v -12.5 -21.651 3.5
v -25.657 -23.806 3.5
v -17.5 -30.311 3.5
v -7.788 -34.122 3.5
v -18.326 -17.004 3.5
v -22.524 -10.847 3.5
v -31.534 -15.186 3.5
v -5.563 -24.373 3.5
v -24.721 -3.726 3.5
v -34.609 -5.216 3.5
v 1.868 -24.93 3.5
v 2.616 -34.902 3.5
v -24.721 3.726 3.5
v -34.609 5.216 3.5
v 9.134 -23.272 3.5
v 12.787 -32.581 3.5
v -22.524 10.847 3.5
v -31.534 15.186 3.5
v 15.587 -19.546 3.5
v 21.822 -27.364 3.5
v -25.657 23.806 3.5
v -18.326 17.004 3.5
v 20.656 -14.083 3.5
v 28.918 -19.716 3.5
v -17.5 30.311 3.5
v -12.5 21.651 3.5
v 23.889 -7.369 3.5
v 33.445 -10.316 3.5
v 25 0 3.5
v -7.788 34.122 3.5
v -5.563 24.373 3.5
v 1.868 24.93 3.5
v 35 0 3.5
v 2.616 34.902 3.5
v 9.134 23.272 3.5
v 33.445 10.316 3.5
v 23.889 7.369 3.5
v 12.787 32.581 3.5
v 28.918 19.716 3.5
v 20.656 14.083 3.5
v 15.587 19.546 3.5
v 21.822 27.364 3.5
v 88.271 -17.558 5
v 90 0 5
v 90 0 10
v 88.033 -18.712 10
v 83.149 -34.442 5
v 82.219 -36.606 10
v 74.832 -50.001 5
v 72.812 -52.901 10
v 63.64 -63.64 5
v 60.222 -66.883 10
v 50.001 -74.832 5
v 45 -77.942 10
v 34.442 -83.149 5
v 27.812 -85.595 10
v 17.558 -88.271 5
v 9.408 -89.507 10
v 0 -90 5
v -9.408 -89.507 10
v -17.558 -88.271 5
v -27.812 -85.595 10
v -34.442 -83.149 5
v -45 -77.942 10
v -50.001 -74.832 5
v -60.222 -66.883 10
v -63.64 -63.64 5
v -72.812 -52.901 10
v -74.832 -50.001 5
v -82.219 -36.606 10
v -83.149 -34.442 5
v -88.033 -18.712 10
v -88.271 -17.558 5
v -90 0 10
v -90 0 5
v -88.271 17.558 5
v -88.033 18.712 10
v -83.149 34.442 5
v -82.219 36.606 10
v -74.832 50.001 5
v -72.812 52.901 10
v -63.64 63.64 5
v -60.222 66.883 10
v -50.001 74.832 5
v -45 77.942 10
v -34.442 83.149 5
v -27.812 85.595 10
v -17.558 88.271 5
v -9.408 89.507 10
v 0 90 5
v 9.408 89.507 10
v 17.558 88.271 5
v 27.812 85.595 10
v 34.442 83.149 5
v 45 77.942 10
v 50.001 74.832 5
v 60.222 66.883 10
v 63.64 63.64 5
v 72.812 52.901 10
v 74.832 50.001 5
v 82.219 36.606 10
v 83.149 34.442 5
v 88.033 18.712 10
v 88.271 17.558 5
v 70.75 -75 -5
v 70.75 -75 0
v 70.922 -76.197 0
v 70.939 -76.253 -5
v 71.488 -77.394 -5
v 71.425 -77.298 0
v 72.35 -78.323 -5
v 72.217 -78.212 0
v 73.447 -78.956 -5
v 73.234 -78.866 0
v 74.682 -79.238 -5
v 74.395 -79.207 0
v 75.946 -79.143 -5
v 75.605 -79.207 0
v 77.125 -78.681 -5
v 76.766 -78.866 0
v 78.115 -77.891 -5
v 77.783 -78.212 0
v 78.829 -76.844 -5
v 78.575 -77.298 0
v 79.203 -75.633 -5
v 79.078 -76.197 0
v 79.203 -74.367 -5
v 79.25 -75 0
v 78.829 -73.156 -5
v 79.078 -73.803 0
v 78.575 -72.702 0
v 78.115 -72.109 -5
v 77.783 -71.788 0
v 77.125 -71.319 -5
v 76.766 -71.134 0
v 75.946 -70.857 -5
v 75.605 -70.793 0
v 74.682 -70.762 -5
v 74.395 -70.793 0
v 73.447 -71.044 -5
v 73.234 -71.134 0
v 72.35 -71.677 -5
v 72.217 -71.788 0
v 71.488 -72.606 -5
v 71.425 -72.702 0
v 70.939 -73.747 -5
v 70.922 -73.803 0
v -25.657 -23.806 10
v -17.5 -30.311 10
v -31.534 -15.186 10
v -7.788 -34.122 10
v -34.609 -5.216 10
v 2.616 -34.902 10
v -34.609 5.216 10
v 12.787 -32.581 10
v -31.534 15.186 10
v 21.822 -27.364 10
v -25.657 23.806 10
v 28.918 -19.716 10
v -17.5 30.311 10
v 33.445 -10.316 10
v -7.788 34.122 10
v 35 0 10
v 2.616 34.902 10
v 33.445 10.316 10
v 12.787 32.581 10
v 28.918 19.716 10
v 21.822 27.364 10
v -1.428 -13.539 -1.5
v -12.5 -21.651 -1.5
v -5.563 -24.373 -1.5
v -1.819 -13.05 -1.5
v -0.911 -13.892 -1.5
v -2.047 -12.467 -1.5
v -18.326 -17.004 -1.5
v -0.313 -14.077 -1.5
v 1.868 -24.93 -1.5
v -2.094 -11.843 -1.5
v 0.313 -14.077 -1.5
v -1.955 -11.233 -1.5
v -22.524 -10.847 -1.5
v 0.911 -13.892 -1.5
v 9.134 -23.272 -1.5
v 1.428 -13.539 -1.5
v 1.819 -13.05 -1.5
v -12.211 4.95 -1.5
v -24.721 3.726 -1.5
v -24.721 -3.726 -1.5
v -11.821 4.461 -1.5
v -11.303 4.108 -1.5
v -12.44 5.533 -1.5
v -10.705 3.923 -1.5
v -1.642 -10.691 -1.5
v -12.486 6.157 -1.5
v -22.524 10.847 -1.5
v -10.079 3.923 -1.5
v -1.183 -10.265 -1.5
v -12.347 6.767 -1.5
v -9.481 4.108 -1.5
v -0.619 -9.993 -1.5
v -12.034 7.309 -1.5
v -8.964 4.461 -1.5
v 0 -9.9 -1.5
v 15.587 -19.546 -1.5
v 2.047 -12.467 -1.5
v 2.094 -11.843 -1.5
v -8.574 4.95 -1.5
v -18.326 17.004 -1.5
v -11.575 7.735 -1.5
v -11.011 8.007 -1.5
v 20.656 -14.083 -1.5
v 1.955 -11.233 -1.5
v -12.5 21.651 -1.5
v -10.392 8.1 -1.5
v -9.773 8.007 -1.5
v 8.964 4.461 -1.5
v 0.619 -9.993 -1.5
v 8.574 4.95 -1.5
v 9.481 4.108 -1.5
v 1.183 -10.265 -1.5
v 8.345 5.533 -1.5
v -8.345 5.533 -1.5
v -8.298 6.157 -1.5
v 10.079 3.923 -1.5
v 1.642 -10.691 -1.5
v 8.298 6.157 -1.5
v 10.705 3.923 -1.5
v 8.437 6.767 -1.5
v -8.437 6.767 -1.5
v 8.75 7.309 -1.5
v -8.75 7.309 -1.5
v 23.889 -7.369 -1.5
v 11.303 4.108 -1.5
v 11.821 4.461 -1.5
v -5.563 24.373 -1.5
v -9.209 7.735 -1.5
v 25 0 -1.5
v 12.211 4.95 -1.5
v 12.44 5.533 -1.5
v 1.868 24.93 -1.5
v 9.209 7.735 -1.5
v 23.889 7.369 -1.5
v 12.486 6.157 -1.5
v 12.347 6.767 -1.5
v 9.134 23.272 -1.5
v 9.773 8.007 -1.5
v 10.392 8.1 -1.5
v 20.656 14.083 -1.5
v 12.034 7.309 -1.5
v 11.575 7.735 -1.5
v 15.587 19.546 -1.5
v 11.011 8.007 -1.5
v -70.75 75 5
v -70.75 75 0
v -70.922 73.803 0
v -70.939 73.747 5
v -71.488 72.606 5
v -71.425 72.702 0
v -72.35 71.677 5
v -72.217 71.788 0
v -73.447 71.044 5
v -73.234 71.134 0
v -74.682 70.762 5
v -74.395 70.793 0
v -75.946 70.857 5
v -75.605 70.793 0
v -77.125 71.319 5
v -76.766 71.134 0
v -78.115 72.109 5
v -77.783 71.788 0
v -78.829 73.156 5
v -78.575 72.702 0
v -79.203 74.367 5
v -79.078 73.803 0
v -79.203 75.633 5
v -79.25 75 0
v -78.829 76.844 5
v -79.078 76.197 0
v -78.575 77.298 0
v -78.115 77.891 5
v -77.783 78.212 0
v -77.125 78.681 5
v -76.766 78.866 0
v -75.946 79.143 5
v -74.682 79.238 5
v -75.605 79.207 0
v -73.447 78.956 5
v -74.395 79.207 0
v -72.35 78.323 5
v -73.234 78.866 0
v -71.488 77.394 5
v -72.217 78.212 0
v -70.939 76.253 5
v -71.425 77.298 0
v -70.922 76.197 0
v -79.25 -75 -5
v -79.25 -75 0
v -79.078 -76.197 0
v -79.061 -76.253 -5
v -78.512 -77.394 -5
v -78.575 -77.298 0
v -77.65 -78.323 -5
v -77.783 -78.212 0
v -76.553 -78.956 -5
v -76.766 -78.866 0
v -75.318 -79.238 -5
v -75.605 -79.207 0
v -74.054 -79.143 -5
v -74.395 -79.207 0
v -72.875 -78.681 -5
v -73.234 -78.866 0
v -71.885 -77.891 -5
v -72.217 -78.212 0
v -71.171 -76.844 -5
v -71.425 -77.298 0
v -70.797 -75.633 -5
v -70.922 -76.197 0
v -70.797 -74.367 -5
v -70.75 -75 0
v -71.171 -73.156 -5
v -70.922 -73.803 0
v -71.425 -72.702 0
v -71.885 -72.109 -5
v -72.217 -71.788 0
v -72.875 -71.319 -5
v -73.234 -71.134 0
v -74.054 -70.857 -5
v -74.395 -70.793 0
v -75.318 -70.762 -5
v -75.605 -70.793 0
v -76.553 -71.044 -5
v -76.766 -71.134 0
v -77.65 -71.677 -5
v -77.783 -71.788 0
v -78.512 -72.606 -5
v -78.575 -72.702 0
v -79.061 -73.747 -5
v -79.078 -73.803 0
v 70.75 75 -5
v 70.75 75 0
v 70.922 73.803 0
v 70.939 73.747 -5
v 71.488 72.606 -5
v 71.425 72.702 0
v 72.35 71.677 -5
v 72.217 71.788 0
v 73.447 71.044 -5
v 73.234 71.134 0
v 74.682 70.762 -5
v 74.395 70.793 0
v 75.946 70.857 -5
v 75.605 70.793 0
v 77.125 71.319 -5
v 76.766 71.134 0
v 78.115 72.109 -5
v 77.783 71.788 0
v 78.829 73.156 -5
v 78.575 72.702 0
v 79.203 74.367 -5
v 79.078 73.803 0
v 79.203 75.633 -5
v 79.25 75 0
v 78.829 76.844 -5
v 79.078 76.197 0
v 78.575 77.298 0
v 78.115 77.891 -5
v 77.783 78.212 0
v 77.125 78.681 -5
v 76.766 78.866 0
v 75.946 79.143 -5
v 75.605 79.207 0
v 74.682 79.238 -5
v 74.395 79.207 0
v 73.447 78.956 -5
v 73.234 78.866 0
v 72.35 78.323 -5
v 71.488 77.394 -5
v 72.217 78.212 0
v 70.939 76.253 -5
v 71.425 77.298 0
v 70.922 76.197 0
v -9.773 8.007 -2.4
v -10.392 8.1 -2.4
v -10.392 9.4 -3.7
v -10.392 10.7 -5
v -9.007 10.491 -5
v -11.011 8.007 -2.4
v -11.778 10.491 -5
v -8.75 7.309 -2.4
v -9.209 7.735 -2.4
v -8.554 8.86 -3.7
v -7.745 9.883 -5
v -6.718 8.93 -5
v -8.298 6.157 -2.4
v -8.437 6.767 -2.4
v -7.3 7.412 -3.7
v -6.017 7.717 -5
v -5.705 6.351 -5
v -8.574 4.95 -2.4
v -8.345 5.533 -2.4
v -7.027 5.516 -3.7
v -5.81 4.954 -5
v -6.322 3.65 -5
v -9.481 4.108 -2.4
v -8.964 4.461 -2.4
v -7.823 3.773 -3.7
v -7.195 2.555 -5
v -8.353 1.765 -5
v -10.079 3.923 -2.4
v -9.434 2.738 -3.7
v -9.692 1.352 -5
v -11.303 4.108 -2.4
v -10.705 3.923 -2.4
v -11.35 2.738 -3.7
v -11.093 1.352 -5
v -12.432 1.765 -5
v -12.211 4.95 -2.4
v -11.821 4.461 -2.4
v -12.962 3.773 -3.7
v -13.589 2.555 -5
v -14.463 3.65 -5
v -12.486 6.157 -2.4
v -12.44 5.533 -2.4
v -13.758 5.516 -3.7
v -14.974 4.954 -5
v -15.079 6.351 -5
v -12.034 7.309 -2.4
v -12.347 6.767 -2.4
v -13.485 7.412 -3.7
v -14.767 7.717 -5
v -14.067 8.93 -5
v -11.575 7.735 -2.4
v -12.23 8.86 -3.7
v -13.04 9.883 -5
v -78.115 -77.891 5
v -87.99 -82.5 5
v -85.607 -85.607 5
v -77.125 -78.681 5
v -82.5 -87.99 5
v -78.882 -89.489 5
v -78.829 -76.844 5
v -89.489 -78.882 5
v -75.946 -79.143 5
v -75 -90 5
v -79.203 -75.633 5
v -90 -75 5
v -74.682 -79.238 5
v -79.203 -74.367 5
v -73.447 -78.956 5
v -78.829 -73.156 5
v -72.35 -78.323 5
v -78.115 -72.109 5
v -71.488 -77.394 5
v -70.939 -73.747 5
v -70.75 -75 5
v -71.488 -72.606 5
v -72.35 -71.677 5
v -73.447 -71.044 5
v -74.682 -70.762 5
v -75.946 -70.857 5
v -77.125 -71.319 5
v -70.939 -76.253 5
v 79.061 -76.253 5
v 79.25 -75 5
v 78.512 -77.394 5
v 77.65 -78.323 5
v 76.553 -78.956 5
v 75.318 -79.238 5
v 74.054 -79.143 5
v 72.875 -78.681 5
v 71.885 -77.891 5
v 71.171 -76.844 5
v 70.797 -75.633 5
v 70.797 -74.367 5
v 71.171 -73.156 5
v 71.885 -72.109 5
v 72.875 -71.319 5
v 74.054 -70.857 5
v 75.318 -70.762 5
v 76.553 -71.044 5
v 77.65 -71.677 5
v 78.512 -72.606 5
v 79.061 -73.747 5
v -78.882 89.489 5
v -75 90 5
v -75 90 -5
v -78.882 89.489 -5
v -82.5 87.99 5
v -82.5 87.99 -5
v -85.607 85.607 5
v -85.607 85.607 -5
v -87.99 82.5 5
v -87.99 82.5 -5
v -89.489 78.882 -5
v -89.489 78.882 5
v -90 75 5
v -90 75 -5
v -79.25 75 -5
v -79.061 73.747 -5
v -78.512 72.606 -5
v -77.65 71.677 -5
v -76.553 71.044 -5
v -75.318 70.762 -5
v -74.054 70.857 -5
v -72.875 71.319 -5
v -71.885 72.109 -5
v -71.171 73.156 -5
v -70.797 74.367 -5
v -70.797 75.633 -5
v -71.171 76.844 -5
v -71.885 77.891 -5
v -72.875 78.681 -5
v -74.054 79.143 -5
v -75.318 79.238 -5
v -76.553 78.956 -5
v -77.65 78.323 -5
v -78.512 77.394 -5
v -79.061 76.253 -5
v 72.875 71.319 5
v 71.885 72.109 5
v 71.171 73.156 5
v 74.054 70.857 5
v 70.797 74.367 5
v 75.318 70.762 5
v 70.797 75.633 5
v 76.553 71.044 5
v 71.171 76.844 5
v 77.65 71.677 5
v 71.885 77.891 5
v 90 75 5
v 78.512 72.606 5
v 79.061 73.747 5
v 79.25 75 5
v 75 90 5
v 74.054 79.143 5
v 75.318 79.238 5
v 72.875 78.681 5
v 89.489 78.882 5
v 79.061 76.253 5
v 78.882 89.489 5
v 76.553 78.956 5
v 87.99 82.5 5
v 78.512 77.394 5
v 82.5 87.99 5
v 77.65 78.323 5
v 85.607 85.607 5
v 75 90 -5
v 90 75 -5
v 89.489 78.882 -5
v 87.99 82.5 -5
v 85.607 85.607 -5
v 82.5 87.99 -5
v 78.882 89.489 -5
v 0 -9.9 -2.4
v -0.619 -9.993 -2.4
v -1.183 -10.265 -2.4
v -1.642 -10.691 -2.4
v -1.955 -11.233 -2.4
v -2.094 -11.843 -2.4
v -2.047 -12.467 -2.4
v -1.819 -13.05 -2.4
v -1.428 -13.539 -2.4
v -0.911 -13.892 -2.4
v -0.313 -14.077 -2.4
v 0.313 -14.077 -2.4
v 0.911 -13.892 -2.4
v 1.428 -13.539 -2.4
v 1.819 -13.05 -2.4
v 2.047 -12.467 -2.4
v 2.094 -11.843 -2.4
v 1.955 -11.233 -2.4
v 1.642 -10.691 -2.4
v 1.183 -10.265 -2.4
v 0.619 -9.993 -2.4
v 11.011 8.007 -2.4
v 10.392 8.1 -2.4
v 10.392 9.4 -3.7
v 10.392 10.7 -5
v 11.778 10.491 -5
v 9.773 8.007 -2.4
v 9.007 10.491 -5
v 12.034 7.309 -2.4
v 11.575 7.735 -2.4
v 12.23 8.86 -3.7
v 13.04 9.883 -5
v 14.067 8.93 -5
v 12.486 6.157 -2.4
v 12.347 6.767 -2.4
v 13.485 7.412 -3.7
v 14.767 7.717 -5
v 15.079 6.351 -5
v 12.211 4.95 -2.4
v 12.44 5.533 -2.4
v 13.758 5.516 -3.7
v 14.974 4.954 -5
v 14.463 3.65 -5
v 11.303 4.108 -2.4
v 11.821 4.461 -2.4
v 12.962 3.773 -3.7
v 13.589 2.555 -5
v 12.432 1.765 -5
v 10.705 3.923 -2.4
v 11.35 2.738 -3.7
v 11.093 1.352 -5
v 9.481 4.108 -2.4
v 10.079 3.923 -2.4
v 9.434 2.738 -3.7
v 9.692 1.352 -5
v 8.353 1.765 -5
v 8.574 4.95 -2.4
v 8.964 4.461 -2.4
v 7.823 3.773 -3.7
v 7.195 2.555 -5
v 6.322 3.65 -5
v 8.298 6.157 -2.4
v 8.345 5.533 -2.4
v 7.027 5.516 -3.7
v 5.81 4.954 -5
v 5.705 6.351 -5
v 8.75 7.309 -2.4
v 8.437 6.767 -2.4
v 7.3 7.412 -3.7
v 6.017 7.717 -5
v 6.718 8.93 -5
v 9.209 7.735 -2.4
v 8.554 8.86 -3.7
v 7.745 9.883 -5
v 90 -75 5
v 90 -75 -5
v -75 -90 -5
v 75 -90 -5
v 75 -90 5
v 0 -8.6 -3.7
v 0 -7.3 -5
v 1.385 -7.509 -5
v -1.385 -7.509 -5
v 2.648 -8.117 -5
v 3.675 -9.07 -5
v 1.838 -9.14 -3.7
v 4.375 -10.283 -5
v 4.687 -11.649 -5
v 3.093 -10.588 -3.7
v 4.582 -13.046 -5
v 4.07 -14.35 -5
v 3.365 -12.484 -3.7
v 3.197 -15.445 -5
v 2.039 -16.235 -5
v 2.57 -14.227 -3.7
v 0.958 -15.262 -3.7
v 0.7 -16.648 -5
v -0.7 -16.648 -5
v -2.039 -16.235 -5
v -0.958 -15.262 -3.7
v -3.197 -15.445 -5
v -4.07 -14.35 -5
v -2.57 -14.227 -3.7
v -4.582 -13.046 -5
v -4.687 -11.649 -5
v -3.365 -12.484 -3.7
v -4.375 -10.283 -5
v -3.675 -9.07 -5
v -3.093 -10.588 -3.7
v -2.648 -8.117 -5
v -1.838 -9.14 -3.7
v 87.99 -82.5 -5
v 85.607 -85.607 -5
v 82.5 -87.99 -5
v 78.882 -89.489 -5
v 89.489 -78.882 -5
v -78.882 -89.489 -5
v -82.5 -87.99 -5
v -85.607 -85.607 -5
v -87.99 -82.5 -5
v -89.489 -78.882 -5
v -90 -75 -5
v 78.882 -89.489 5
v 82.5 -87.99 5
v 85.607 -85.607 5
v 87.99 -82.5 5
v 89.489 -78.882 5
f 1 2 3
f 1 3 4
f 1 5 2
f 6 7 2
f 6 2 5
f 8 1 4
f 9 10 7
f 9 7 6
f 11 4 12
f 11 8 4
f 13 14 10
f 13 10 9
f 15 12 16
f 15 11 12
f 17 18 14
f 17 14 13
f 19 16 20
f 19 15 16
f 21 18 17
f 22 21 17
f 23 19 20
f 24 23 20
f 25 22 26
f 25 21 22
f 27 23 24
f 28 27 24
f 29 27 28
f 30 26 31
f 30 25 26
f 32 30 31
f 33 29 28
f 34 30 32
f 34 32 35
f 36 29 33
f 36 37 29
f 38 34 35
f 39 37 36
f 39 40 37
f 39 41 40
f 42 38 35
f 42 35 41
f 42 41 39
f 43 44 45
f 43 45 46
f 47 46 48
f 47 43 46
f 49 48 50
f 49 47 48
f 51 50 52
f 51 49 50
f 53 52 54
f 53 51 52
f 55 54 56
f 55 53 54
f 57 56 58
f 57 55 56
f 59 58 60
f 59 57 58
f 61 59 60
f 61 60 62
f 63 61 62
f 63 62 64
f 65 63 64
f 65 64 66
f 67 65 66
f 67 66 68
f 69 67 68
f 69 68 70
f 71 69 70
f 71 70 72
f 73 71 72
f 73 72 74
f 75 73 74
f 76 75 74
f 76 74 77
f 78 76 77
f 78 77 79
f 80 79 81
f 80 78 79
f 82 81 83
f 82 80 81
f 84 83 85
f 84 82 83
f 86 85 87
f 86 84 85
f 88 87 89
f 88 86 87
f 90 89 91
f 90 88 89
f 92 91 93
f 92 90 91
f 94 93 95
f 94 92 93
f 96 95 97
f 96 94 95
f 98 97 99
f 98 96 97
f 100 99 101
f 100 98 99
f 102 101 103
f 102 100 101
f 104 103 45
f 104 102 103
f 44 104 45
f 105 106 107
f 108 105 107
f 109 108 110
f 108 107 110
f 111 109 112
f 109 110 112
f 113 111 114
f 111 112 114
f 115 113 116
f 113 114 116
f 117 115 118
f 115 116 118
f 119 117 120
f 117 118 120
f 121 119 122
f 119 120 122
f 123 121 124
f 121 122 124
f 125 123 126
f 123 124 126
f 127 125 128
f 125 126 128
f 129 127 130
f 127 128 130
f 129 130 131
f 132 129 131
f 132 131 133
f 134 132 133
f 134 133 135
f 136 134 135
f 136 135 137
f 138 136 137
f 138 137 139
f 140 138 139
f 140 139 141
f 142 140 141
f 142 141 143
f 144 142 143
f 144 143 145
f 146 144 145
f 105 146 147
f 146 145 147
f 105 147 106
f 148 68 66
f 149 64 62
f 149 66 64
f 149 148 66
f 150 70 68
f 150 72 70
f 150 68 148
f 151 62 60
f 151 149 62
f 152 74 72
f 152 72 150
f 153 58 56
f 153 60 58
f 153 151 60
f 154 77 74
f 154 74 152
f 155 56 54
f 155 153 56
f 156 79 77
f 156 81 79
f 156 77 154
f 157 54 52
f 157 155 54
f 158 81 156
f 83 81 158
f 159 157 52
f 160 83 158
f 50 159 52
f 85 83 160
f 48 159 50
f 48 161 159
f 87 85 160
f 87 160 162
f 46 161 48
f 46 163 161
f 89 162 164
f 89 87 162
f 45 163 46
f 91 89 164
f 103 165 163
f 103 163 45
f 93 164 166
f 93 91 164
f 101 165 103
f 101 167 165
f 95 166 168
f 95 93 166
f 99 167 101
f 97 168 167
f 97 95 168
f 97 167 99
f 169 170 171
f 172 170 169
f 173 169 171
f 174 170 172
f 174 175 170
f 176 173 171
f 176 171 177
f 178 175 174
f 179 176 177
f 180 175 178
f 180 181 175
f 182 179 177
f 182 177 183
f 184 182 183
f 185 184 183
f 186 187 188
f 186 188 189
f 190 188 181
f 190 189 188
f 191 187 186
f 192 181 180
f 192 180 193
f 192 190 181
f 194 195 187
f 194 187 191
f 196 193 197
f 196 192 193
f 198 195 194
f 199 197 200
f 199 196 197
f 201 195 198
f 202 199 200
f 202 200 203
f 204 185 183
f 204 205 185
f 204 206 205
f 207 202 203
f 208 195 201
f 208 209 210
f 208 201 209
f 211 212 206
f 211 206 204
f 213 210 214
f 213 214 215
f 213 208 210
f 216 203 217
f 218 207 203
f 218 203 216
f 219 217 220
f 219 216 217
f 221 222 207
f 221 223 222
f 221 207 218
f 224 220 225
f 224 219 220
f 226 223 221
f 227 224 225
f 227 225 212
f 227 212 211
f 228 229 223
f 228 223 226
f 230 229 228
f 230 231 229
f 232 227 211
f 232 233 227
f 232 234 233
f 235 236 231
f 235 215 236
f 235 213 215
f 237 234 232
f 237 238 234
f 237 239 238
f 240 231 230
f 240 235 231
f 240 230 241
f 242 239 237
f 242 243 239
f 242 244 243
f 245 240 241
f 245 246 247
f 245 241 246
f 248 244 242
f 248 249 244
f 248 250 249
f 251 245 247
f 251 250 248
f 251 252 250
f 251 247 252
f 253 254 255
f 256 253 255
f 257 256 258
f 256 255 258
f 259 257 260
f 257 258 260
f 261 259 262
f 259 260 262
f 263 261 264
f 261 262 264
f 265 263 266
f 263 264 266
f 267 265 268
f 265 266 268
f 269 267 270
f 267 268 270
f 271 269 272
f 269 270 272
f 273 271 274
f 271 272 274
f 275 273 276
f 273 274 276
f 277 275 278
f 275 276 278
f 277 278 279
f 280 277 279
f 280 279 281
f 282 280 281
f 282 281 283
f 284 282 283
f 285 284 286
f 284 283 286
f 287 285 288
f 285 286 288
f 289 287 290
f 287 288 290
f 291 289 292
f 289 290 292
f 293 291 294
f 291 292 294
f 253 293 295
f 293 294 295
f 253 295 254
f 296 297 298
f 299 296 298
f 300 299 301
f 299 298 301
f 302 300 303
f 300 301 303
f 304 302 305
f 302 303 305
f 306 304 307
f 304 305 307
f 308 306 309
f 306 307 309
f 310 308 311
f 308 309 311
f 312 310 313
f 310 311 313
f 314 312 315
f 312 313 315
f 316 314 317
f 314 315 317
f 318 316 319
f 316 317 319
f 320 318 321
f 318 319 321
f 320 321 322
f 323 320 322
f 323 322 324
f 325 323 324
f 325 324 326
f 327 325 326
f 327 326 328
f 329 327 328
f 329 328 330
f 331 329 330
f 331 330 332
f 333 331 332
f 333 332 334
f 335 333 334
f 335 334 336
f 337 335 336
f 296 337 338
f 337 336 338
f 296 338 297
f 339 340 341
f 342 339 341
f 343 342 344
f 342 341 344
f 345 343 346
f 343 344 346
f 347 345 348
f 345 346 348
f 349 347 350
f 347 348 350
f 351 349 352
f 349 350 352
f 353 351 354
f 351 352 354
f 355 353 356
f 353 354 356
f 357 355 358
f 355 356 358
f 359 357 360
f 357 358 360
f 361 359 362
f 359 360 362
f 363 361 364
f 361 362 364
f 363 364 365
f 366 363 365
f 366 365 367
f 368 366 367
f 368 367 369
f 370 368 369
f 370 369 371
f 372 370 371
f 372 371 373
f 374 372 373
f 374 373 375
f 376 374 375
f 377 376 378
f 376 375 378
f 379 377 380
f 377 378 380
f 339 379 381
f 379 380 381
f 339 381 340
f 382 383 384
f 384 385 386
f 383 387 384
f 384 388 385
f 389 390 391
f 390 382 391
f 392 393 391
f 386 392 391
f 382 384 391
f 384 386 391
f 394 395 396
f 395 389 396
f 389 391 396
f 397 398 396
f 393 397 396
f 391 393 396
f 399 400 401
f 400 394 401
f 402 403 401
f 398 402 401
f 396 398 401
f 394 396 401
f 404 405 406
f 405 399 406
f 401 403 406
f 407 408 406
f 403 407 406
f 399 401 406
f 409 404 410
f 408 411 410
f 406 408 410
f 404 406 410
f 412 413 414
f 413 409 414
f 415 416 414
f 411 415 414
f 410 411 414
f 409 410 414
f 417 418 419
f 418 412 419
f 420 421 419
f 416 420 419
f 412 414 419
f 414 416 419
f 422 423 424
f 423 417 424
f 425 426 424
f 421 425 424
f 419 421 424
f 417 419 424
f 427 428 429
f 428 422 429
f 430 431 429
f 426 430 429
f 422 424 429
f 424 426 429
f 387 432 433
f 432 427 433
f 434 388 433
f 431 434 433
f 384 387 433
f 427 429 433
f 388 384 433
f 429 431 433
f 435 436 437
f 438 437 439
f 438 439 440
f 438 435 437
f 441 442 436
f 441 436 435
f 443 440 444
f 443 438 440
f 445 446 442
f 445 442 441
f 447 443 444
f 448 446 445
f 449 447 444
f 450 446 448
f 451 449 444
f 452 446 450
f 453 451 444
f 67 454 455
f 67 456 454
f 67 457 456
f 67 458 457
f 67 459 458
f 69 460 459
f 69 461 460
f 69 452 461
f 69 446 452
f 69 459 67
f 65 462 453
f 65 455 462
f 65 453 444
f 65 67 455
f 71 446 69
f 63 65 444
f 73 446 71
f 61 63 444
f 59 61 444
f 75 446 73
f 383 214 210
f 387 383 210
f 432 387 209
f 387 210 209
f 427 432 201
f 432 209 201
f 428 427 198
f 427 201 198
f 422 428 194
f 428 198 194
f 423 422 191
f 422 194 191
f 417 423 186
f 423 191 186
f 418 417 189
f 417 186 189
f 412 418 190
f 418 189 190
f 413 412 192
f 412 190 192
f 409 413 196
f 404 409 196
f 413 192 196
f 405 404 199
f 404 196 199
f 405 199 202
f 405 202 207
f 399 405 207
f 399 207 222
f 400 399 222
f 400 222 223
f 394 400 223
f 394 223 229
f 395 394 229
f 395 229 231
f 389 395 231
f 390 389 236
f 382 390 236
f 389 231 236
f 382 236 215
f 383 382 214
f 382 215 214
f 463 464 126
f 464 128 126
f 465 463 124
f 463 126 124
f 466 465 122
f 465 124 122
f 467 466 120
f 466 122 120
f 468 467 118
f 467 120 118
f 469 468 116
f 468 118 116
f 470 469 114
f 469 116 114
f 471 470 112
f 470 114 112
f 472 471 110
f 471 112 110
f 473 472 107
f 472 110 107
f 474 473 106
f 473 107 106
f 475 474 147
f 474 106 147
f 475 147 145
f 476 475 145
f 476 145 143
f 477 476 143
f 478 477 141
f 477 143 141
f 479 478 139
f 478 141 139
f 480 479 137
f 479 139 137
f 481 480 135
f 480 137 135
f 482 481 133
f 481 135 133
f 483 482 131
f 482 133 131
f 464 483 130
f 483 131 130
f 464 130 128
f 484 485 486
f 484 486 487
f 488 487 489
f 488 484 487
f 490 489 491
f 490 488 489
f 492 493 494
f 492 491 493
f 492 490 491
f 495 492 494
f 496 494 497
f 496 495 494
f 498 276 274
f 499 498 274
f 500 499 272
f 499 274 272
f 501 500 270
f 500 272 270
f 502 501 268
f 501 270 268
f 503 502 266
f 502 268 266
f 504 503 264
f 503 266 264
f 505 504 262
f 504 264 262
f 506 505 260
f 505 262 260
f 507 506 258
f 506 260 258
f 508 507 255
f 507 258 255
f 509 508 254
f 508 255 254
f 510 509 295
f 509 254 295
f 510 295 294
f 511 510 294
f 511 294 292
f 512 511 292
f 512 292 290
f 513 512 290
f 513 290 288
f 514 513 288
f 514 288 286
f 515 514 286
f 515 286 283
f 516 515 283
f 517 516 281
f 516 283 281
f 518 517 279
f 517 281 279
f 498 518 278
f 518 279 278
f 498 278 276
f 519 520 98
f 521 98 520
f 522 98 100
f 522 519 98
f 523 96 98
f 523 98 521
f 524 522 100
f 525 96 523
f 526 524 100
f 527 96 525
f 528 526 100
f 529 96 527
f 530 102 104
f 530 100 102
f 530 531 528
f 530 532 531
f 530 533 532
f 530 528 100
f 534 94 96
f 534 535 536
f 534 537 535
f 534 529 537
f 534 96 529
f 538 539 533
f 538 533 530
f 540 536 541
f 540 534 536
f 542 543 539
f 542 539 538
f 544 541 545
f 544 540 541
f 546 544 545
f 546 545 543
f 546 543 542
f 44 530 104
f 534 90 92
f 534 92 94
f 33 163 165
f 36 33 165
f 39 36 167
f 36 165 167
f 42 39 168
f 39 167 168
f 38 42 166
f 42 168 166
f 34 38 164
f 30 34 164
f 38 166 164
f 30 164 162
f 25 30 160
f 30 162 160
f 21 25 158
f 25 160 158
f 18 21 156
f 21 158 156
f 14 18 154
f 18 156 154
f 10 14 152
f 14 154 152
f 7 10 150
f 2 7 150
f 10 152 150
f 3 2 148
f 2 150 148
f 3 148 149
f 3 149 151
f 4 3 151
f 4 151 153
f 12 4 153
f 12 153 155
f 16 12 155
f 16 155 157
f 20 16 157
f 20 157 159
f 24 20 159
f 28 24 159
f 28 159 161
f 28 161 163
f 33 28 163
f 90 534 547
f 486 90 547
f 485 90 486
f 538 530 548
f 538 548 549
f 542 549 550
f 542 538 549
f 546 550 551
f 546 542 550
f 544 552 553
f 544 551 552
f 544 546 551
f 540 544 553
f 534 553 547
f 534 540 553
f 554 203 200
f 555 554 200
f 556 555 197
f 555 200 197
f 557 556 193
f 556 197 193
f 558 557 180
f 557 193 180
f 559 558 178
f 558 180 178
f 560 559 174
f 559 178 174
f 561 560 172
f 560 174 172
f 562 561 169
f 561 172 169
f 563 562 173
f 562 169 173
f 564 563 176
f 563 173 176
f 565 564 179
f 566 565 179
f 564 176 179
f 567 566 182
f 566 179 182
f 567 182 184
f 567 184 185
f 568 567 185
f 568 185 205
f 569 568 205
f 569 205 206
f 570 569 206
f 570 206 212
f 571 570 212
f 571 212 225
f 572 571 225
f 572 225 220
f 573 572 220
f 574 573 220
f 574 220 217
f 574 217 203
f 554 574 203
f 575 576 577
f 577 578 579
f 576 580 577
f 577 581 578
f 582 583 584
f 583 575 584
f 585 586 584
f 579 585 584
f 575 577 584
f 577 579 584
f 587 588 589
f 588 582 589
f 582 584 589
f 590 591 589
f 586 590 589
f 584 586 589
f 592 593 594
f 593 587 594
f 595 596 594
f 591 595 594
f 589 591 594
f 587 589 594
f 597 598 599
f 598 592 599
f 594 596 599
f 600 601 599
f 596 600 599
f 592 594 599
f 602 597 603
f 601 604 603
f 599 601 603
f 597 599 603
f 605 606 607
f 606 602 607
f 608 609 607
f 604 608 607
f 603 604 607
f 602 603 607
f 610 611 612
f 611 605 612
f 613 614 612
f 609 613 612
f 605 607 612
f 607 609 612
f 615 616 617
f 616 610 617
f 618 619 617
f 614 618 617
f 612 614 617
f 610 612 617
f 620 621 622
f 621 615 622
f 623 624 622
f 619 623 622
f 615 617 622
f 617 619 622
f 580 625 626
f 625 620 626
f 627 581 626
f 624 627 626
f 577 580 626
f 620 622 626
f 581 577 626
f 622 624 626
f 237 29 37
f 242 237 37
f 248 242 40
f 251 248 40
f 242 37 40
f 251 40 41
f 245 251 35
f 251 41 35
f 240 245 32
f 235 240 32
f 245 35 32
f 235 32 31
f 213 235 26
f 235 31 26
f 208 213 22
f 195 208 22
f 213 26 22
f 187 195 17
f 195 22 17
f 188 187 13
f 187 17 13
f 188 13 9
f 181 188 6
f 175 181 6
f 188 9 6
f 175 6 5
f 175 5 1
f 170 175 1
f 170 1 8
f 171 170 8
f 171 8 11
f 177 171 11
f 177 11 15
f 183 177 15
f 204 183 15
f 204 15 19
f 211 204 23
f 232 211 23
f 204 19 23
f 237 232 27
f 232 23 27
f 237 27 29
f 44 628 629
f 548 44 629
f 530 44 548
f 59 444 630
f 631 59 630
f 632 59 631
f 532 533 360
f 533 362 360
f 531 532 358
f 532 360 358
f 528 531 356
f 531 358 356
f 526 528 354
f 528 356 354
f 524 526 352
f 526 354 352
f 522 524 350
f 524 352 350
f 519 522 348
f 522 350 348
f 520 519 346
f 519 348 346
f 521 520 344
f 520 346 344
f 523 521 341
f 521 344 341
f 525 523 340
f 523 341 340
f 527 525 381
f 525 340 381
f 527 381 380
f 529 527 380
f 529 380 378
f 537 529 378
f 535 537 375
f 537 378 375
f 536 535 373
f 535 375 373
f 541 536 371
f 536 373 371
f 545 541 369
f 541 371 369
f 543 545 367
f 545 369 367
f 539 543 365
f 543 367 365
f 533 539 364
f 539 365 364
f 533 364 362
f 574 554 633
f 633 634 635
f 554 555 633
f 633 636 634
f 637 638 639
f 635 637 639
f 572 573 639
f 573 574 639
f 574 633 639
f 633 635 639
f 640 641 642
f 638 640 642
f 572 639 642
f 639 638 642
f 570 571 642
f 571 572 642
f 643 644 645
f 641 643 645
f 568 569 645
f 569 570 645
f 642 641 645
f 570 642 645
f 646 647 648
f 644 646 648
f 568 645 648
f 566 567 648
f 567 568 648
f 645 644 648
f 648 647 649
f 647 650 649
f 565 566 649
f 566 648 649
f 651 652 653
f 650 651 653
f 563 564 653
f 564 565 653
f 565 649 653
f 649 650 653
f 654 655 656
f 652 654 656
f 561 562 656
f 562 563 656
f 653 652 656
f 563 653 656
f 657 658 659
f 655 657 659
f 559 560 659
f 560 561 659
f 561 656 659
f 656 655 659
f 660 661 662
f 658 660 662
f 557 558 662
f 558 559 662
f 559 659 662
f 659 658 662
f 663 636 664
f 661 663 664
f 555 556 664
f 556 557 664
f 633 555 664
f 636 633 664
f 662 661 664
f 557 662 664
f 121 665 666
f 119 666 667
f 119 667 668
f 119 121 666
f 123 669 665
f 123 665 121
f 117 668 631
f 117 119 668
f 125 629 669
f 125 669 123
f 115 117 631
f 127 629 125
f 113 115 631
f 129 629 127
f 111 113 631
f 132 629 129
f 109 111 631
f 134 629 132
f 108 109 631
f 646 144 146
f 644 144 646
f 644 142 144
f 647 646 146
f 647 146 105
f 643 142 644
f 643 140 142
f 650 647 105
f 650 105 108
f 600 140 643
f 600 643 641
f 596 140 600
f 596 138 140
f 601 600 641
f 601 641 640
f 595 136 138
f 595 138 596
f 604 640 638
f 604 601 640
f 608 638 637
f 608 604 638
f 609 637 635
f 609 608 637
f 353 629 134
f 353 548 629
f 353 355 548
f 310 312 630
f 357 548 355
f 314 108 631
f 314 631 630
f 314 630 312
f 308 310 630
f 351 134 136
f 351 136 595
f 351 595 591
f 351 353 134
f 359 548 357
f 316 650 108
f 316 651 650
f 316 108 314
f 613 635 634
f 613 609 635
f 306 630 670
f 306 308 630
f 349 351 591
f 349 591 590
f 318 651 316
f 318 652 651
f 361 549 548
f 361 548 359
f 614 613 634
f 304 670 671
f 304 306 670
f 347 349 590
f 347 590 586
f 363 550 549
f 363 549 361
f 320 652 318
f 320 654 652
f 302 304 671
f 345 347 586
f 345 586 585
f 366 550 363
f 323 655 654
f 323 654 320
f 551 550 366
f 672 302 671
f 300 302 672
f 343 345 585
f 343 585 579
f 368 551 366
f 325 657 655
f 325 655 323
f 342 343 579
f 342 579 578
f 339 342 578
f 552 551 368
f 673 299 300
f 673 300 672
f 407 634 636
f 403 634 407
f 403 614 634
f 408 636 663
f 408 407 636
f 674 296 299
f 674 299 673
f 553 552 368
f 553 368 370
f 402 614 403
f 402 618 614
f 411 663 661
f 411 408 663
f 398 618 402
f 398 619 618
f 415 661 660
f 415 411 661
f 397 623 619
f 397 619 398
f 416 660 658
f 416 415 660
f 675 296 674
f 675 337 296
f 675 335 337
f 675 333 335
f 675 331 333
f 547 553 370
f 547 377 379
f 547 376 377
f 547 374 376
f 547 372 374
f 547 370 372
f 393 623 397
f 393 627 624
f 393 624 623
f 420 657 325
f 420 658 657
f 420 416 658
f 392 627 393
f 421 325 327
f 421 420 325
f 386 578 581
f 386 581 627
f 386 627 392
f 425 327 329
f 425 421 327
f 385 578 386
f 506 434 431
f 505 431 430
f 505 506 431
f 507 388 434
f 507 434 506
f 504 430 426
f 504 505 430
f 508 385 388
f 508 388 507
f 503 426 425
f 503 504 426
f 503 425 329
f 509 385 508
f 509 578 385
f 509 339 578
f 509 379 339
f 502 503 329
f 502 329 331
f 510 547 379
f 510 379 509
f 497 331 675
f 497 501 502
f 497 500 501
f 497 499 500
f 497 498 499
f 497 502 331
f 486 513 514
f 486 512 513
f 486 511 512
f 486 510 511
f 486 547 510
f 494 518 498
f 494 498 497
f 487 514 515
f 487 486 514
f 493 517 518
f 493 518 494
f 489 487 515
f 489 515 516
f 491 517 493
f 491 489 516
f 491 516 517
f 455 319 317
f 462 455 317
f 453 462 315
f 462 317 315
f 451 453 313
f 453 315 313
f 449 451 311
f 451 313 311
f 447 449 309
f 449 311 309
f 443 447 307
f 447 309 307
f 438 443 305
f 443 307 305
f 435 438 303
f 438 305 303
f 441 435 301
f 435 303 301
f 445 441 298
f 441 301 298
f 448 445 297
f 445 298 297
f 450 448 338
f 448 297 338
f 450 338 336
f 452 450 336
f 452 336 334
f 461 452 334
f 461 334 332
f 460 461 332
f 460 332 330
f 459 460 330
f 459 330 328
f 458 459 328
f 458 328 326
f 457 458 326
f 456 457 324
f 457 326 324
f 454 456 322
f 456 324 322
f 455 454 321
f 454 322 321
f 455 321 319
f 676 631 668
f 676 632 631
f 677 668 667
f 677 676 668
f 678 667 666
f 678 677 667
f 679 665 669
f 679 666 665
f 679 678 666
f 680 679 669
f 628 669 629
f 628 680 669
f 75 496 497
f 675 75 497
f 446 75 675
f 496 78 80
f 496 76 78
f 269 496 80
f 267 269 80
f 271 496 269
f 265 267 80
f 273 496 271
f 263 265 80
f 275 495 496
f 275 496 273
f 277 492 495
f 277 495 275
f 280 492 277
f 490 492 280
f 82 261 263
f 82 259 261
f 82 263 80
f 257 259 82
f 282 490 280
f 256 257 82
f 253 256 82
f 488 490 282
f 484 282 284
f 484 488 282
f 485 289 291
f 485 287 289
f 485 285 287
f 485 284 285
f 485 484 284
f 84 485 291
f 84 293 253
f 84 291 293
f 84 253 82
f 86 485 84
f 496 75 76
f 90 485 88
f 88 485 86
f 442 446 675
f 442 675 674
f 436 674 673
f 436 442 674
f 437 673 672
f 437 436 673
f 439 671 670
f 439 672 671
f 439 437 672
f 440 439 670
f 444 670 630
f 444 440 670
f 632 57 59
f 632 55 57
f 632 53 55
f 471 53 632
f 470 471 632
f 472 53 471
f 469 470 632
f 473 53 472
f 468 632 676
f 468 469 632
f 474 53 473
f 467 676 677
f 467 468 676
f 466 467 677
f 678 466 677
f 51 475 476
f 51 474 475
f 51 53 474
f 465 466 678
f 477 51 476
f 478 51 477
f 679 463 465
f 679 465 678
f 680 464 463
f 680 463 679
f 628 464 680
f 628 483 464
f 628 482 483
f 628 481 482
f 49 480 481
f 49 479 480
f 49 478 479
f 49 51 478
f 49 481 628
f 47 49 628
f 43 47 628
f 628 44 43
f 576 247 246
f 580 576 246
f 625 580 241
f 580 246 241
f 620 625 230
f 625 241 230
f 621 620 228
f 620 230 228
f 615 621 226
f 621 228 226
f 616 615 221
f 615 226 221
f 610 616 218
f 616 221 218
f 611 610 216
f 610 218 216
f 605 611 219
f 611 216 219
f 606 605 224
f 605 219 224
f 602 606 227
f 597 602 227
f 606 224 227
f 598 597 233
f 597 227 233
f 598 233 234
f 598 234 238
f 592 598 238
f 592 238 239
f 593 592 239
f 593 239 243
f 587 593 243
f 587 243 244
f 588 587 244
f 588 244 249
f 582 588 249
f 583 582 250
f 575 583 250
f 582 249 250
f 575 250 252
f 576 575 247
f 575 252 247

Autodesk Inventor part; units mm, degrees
ref_plane "YZ Plane" through (0, 0, 0) normal (1, 0, 0) x (0, 1, 0)
ref_plane "XZ Plane" through (0, 0, 0) normal (0, 1, 0) x (-1, 0, 0)
ref_plane "XY Plane" through (0, 0, 0) normal (0, 0, 1) x (1, 0, 0)
sketch "Sketch1" plane through (0, 0, 0) normal (0, 0, 1) x (1, 0, 0)
  circle A0 centre (0, 0) radius 90
  circle A1 centre (0, 0) radius 35
  line L0 (-75, 90) -> (75, 90)
  line L1 (90, 75) -> (90, -75)
  line L2 (75, -90) -> (-75, -90)
  line L3 (-90, -75) -> (-90, 75)
  line L4 (-90, 90) -> (90, -90) construction
  line L5 (90, 90) -> (-90, -90) construction
  arc A2 (-75, 90) -> (-90, 75) centre (-75, 75) ccw
  arc A3 (90, 75) -> (75, 90) centre (75, 75) ccw
  arc A4 (75, -90) -> (90, -75) centre (75, -75) ccw
  arc A5 (-90, -75) -> (-75, -90) centre (-75, -75) ccw
  circle A6 centre (75, 75) radius 4.25
  circle A7 centre (75, -75) radius 4.25
  circle A8 centre (-75, -75) radius 4.25
  circle A9 centre (-75, 75) radius 4.25
  point P0 (0, 90)
  point P1 (90, 0)
  point P2 (0, -90)
  point P3 (-90, 0)
  dimension "d0" = 180
  dimension "d1" = 70
  dimension "d2" = 15
  dimension "d3" = 8.5
extrude "Extrusion1" add sketch "Sketch1" along normal blind 10 contours A0 | A1
extrude "Extrusion2" add sketch "Sketch1" along normal blind 5 contours L1 A4 L2 A0 | A0 L0 A3 L1 | A0 L3 A2 L0 | L2 A5 L3 A0
sketch "Sketch2" plane through (0, 0, 10) normal (0, 0, 1) x (1, 0, 0)
  circle A0 centre (0, 0) radius 35
  dimension "d8" = 70
extrude "Extrusion3" cut sketch "Sketch2" against normal blind 6.5
sketch "Sketch3" plane through (0, 0, 0) normal (0, 0, -1) x (-1, 0, 0)
  circle A0 centre (-75, 75) radius 4.25 projected
  circle A1 centre (75, 75) radius 4.25 projected
  circle A2 centre (-75, -75) radius 4.25 projected
  circle A3 centre (75, -75) radius 4.25 projected
  line L0 (-90, -75) -> (-90, 75) projected
  arc A4 (-90, -75) -> (-75, -90) centre (-75, -75) ccw projected
  line L1 (75, -90) -> (-75, -90) projected
  arc A5 (75, -90) -> (90, -75) centre (75, -75) ccw projected
  line L2 (90, 75) -> (90, -75) projected
  arc A6 (90, 75) -> (75, 90) centre (75, 75) ccw projected
  line L3 (-75, 90) -> (75, 90) projected
  arc A7 (-75, 90) -> (-90, 75) centre (-75, 75) ccw projected
  point P0 (0, 0)
extrude "Extrusion4" add sketch "Sketch3" along normal blind 5
sketch "Sketch4" plane through (0, 0, 3.5) normal (0, 0, 1) x (1, 0, 0)
  circle A0 centre (0, 0) radius 35 projected
  circle A1 centre (0, 0) radius 25
  dimension "d13" = 50
extrude "Extrusion5" cut sketch "Sketch4" against normal blind 5 contours A1
sketch "Sketch5" plane through (0, 0, -5) normal (0, 0, -1) x (-1, 0, 0)
  circle A0 centre (10.3923, 6) radius 1.621 projected
  circle A1 centre (0, -12) radius 1.621 projected
  circle A2 centre (-10.3923, 6) radius 1.621 projected
  circle A3 centre (0, 0) radius 4 projected
  circle A4 centre (0, 0) radius 15 projected
  circle A5 centre (10.3923, 6) radius 2
  circle A6 centre (-10.3923, 6) radius 2
  circle A7 centre (0, -12) radius 2
  dimension "d23" = 4
  dimension "d24" = 4
  dimension "d25" = 4
hole "Hole1" at (10.3923, 6, -5) at (-10.3923, 6, -5) at (0, -12, -5) direction (0, 0, 1) diameter 4.2 end through all countersink diameter 9.4 countersink angle 90 clearance for "Countersunk Flat Head Screw ISO 2009/7046" size "M4" standard "ISO"
properties part number "base onderkant" material "Aluminum 6061"
